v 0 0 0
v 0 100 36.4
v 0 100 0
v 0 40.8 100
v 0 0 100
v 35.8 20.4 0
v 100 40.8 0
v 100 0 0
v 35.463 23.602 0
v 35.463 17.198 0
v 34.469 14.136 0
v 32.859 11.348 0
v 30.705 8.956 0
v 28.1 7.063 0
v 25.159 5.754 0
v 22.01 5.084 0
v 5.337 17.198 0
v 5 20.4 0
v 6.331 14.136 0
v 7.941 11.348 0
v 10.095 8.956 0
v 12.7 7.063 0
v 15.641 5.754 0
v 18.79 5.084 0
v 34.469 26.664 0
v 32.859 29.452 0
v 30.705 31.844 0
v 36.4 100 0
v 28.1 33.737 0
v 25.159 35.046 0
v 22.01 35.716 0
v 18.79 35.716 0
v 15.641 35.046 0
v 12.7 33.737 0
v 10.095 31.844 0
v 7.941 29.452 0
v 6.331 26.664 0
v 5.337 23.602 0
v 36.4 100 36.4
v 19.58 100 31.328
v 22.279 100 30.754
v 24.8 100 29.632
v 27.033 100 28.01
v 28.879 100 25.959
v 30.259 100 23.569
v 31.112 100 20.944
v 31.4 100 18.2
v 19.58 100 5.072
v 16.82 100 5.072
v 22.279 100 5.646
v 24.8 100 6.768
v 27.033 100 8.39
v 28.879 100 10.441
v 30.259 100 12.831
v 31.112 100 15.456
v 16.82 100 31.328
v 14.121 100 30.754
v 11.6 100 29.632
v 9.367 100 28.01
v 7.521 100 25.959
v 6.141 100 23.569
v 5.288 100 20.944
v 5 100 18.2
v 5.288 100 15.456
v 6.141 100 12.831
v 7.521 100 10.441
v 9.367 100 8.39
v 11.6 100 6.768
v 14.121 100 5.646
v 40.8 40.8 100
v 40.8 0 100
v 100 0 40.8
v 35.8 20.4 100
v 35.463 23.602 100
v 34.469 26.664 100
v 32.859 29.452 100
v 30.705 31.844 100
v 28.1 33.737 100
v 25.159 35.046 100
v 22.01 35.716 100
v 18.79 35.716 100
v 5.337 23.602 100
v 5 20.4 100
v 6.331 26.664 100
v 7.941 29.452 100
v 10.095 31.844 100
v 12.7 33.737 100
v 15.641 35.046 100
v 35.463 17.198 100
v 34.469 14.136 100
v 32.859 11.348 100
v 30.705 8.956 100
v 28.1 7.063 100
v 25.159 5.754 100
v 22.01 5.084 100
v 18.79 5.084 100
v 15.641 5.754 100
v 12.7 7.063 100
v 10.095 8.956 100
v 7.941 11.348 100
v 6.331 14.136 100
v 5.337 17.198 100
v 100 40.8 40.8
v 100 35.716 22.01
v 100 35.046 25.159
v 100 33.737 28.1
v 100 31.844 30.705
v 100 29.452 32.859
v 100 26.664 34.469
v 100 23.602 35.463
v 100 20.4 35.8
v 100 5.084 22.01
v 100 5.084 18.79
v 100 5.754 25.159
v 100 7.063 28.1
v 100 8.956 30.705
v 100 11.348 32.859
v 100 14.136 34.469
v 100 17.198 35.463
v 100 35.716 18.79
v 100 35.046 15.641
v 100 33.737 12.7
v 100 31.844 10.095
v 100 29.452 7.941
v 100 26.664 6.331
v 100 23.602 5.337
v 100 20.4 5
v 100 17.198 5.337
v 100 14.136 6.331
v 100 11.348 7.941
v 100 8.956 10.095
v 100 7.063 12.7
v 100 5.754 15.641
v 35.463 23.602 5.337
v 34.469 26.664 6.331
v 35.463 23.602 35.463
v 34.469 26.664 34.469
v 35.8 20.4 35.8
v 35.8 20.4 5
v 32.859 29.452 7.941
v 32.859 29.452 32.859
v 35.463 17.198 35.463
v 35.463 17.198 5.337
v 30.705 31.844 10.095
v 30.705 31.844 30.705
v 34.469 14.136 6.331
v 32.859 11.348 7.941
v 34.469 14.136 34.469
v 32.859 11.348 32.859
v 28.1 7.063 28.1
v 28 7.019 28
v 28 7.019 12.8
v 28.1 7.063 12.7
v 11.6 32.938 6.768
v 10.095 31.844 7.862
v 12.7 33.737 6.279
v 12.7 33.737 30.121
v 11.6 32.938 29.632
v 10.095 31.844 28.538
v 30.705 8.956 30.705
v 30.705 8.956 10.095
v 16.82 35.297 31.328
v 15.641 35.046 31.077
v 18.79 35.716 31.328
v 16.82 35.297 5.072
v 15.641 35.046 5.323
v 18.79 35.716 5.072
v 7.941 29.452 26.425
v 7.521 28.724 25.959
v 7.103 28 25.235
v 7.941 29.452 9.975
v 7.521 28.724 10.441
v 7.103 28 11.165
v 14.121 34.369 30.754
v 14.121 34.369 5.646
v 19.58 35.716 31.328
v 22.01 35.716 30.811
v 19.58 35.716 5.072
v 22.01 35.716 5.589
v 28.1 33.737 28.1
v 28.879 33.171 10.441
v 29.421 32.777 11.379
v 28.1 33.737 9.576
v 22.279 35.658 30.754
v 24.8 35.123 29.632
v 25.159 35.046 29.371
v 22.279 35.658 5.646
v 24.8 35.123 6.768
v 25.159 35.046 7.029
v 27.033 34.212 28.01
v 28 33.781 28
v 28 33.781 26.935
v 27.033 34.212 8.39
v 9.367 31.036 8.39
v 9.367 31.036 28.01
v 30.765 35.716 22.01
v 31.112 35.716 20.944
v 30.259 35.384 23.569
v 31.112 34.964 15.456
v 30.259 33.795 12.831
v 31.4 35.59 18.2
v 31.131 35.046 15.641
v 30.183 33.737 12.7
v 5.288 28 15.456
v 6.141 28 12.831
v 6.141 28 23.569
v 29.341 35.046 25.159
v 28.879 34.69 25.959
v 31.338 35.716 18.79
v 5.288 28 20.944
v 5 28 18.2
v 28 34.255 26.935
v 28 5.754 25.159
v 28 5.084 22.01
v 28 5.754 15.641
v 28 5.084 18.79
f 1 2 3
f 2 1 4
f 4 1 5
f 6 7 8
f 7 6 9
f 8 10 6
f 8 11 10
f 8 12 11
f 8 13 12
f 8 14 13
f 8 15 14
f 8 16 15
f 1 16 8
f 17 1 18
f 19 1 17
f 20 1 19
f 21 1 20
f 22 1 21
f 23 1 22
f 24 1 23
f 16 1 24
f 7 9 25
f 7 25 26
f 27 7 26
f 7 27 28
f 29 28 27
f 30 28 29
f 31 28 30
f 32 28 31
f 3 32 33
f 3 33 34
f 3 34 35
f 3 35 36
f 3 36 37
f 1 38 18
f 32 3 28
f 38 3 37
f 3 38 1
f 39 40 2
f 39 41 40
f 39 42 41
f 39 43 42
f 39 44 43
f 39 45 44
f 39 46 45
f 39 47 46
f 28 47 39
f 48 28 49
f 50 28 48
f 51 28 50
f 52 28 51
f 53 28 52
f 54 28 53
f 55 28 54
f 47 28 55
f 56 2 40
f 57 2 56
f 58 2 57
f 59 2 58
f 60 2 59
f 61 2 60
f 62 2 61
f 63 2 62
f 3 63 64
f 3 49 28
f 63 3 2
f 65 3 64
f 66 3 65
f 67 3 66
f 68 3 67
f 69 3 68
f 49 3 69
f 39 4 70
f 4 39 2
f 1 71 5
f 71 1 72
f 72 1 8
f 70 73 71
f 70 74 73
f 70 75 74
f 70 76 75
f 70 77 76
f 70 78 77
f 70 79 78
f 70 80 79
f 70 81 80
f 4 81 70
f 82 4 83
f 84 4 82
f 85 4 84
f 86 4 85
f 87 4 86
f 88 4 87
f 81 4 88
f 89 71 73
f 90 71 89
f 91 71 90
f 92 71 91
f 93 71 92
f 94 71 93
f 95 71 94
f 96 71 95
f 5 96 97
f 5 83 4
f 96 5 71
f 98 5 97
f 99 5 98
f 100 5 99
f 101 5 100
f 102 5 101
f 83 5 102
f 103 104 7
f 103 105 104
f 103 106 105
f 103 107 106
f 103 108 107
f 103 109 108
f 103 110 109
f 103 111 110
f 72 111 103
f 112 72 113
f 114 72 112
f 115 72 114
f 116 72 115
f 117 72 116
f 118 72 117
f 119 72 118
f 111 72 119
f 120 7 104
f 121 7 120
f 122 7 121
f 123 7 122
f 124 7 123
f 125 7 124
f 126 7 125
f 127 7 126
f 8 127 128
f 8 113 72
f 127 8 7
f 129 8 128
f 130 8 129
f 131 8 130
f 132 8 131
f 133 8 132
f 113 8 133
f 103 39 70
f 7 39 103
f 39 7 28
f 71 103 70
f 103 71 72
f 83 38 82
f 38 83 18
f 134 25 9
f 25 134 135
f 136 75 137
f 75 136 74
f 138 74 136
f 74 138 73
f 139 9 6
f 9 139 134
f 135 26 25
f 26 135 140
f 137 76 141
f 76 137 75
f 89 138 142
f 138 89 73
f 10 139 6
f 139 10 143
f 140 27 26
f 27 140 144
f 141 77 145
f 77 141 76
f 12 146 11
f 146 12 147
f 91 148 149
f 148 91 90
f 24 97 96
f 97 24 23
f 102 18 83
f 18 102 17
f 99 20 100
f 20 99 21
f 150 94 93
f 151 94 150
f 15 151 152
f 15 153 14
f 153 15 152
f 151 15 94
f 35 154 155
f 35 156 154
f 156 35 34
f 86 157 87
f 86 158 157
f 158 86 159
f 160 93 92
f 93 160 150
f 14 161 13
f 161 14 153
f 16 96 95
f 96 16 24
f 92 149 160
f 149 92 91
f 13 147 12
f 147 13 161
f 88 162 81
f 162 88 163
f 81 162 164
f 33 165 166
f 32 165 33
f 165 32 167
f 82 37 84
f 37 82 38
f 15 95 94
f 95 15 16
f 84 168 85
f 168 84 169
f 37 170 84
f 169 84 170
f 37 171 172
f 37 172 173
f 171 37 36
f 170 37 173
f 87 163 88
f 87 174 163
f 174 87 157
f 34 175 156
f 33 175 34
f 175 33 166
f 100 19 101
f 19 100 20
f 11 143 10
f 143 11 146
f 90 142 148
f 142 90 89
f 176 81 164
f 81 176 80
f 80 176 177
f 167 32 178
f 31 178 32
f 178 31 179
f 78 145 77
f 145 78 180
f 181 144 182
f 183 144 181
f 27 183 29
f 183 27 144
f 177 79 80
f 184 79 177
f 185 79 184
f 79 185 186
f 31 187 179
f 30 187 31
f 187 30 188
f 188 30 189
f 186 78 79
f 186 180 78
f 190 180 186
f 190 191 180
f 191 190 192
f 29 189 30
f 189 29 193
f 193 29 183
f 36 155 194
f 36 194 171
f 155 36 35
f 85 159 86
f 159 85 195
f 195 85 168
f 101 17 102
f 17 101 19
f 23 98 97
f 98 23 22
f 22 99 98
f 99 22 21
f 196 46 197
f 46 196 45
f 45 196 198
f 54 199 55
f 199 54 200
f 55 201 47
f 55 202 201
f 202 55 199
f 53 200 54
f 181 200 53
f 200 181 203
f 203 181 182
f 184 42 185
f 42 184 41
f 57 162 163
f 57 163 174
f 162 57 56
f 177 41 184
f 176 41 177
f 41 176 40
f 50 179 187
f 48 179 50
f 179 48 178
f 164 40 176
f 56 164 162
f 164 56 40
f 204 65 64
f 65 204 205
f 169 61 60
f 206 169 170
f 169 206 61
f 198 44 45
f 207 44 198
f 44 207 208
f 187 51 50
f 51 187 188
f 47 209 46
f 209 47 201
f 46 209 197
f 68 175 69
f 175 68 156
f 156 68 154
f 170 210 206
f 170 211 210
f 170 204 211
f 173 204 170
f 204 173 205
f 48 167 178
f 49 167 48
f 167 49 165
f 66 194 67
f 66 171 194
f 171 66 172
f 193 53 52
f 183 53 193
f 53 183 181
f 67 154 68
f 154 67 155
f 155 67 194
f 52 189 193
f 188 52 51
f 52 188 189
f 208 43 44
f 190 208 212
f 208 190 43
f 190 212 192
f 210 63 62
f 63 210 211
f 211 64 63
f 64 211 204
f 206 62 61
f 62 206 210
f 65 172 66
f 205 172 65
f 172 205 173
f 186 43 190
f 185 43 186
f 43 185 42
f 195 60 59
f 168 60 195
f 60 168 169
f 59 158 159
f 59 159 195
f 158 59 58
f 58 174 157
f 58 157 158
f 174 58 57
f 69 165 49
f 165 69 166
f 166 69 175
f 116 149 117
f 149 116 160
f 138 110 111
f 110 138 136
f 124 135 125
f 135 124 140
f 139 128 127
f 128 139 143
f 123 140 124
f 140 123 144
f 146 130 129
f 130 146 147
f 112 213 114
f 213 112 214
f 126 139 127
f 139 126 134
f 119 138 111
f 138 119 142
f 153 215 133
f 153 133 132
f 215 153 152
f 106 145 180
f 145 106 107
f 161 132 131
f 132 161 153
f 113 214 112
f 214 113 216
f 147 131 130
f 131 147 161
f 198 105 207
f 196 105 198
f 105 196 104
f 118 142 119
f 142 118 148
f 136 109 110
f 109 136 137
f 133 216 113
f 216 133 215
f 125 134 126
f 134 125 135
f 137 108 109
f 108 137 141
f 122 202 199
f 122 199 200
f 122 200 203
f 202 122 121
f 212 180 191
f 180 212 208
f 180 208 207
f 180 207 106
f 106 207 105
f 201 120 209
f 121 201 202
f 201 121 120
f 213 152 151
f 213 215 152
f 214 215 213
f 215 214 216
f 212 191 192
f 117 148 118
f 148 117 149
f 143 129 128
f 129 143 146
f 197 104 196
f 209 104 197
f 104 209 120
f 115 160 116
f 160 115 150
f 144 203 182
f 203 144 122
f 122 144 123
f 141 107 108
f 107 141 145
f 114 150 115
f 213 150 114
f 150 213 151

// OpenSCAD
//FDM Insel
//Halter an Platte
rRohr = 14*1.1;
module plattenHalter() {
    difference() {
        linear_extrude(height=50, scale=0.5)square(80,center=true);
        cylinder(r=rRohr,h=51);
        tr_xy(x=30) {
            cylinder(r=5,h=25);
            translate([0,0,10])cylinder(r=10,h=40);
        }
    }    
}
//Verbidnungsstück
rRohr2=12*1.1;
rRohr3=14*1.1;
length=100;
wall=10;
distance=28;
module verbindung() {
    *translate([135/2-25,105/2-25])linear_extrude(height=5)platte();
    difference() {
        hull() {
            cube([2*rRohr+wall,2*rRohr+wall,length]);
            cube([2*rRohr2+wall,length,2*rRohr2+wall]);
            cube([length,2*rRohr3+wall,2*rRohr3+wall]);
        }
        translate([rRohr+wall/2,rRohr+wall/2],0)cylinder(h=length,r=rRohr);
        translate([rRohr2+wall/2,distance,rRohr2+wall/2])rotate([-90,0,0])cylinder(h=length,r=rRohr2);
        translate([distance,rRohr3+wall/2,rRohr3+wall/2])rotate([0,90,0])cylinder(h=length,r=rRohr3);
        
    }
}


plattenHalter();
!verbindung();

//Helper Modules
module platte() {
    difference() {
        square([135,105],center=true);
        tr_xy(x=105/2,y=80/2)circle(r=5);
    }
}
module tr_xy(x,y=0) {
	if(y==0) {
		for(i=[-1,1])for(j=[-1,1])translate([x*i,x*j])children();
	} else {
		for(i=[-1,1])for(j=[-1,1])translate([x*i,y*j])children();
	}
}
